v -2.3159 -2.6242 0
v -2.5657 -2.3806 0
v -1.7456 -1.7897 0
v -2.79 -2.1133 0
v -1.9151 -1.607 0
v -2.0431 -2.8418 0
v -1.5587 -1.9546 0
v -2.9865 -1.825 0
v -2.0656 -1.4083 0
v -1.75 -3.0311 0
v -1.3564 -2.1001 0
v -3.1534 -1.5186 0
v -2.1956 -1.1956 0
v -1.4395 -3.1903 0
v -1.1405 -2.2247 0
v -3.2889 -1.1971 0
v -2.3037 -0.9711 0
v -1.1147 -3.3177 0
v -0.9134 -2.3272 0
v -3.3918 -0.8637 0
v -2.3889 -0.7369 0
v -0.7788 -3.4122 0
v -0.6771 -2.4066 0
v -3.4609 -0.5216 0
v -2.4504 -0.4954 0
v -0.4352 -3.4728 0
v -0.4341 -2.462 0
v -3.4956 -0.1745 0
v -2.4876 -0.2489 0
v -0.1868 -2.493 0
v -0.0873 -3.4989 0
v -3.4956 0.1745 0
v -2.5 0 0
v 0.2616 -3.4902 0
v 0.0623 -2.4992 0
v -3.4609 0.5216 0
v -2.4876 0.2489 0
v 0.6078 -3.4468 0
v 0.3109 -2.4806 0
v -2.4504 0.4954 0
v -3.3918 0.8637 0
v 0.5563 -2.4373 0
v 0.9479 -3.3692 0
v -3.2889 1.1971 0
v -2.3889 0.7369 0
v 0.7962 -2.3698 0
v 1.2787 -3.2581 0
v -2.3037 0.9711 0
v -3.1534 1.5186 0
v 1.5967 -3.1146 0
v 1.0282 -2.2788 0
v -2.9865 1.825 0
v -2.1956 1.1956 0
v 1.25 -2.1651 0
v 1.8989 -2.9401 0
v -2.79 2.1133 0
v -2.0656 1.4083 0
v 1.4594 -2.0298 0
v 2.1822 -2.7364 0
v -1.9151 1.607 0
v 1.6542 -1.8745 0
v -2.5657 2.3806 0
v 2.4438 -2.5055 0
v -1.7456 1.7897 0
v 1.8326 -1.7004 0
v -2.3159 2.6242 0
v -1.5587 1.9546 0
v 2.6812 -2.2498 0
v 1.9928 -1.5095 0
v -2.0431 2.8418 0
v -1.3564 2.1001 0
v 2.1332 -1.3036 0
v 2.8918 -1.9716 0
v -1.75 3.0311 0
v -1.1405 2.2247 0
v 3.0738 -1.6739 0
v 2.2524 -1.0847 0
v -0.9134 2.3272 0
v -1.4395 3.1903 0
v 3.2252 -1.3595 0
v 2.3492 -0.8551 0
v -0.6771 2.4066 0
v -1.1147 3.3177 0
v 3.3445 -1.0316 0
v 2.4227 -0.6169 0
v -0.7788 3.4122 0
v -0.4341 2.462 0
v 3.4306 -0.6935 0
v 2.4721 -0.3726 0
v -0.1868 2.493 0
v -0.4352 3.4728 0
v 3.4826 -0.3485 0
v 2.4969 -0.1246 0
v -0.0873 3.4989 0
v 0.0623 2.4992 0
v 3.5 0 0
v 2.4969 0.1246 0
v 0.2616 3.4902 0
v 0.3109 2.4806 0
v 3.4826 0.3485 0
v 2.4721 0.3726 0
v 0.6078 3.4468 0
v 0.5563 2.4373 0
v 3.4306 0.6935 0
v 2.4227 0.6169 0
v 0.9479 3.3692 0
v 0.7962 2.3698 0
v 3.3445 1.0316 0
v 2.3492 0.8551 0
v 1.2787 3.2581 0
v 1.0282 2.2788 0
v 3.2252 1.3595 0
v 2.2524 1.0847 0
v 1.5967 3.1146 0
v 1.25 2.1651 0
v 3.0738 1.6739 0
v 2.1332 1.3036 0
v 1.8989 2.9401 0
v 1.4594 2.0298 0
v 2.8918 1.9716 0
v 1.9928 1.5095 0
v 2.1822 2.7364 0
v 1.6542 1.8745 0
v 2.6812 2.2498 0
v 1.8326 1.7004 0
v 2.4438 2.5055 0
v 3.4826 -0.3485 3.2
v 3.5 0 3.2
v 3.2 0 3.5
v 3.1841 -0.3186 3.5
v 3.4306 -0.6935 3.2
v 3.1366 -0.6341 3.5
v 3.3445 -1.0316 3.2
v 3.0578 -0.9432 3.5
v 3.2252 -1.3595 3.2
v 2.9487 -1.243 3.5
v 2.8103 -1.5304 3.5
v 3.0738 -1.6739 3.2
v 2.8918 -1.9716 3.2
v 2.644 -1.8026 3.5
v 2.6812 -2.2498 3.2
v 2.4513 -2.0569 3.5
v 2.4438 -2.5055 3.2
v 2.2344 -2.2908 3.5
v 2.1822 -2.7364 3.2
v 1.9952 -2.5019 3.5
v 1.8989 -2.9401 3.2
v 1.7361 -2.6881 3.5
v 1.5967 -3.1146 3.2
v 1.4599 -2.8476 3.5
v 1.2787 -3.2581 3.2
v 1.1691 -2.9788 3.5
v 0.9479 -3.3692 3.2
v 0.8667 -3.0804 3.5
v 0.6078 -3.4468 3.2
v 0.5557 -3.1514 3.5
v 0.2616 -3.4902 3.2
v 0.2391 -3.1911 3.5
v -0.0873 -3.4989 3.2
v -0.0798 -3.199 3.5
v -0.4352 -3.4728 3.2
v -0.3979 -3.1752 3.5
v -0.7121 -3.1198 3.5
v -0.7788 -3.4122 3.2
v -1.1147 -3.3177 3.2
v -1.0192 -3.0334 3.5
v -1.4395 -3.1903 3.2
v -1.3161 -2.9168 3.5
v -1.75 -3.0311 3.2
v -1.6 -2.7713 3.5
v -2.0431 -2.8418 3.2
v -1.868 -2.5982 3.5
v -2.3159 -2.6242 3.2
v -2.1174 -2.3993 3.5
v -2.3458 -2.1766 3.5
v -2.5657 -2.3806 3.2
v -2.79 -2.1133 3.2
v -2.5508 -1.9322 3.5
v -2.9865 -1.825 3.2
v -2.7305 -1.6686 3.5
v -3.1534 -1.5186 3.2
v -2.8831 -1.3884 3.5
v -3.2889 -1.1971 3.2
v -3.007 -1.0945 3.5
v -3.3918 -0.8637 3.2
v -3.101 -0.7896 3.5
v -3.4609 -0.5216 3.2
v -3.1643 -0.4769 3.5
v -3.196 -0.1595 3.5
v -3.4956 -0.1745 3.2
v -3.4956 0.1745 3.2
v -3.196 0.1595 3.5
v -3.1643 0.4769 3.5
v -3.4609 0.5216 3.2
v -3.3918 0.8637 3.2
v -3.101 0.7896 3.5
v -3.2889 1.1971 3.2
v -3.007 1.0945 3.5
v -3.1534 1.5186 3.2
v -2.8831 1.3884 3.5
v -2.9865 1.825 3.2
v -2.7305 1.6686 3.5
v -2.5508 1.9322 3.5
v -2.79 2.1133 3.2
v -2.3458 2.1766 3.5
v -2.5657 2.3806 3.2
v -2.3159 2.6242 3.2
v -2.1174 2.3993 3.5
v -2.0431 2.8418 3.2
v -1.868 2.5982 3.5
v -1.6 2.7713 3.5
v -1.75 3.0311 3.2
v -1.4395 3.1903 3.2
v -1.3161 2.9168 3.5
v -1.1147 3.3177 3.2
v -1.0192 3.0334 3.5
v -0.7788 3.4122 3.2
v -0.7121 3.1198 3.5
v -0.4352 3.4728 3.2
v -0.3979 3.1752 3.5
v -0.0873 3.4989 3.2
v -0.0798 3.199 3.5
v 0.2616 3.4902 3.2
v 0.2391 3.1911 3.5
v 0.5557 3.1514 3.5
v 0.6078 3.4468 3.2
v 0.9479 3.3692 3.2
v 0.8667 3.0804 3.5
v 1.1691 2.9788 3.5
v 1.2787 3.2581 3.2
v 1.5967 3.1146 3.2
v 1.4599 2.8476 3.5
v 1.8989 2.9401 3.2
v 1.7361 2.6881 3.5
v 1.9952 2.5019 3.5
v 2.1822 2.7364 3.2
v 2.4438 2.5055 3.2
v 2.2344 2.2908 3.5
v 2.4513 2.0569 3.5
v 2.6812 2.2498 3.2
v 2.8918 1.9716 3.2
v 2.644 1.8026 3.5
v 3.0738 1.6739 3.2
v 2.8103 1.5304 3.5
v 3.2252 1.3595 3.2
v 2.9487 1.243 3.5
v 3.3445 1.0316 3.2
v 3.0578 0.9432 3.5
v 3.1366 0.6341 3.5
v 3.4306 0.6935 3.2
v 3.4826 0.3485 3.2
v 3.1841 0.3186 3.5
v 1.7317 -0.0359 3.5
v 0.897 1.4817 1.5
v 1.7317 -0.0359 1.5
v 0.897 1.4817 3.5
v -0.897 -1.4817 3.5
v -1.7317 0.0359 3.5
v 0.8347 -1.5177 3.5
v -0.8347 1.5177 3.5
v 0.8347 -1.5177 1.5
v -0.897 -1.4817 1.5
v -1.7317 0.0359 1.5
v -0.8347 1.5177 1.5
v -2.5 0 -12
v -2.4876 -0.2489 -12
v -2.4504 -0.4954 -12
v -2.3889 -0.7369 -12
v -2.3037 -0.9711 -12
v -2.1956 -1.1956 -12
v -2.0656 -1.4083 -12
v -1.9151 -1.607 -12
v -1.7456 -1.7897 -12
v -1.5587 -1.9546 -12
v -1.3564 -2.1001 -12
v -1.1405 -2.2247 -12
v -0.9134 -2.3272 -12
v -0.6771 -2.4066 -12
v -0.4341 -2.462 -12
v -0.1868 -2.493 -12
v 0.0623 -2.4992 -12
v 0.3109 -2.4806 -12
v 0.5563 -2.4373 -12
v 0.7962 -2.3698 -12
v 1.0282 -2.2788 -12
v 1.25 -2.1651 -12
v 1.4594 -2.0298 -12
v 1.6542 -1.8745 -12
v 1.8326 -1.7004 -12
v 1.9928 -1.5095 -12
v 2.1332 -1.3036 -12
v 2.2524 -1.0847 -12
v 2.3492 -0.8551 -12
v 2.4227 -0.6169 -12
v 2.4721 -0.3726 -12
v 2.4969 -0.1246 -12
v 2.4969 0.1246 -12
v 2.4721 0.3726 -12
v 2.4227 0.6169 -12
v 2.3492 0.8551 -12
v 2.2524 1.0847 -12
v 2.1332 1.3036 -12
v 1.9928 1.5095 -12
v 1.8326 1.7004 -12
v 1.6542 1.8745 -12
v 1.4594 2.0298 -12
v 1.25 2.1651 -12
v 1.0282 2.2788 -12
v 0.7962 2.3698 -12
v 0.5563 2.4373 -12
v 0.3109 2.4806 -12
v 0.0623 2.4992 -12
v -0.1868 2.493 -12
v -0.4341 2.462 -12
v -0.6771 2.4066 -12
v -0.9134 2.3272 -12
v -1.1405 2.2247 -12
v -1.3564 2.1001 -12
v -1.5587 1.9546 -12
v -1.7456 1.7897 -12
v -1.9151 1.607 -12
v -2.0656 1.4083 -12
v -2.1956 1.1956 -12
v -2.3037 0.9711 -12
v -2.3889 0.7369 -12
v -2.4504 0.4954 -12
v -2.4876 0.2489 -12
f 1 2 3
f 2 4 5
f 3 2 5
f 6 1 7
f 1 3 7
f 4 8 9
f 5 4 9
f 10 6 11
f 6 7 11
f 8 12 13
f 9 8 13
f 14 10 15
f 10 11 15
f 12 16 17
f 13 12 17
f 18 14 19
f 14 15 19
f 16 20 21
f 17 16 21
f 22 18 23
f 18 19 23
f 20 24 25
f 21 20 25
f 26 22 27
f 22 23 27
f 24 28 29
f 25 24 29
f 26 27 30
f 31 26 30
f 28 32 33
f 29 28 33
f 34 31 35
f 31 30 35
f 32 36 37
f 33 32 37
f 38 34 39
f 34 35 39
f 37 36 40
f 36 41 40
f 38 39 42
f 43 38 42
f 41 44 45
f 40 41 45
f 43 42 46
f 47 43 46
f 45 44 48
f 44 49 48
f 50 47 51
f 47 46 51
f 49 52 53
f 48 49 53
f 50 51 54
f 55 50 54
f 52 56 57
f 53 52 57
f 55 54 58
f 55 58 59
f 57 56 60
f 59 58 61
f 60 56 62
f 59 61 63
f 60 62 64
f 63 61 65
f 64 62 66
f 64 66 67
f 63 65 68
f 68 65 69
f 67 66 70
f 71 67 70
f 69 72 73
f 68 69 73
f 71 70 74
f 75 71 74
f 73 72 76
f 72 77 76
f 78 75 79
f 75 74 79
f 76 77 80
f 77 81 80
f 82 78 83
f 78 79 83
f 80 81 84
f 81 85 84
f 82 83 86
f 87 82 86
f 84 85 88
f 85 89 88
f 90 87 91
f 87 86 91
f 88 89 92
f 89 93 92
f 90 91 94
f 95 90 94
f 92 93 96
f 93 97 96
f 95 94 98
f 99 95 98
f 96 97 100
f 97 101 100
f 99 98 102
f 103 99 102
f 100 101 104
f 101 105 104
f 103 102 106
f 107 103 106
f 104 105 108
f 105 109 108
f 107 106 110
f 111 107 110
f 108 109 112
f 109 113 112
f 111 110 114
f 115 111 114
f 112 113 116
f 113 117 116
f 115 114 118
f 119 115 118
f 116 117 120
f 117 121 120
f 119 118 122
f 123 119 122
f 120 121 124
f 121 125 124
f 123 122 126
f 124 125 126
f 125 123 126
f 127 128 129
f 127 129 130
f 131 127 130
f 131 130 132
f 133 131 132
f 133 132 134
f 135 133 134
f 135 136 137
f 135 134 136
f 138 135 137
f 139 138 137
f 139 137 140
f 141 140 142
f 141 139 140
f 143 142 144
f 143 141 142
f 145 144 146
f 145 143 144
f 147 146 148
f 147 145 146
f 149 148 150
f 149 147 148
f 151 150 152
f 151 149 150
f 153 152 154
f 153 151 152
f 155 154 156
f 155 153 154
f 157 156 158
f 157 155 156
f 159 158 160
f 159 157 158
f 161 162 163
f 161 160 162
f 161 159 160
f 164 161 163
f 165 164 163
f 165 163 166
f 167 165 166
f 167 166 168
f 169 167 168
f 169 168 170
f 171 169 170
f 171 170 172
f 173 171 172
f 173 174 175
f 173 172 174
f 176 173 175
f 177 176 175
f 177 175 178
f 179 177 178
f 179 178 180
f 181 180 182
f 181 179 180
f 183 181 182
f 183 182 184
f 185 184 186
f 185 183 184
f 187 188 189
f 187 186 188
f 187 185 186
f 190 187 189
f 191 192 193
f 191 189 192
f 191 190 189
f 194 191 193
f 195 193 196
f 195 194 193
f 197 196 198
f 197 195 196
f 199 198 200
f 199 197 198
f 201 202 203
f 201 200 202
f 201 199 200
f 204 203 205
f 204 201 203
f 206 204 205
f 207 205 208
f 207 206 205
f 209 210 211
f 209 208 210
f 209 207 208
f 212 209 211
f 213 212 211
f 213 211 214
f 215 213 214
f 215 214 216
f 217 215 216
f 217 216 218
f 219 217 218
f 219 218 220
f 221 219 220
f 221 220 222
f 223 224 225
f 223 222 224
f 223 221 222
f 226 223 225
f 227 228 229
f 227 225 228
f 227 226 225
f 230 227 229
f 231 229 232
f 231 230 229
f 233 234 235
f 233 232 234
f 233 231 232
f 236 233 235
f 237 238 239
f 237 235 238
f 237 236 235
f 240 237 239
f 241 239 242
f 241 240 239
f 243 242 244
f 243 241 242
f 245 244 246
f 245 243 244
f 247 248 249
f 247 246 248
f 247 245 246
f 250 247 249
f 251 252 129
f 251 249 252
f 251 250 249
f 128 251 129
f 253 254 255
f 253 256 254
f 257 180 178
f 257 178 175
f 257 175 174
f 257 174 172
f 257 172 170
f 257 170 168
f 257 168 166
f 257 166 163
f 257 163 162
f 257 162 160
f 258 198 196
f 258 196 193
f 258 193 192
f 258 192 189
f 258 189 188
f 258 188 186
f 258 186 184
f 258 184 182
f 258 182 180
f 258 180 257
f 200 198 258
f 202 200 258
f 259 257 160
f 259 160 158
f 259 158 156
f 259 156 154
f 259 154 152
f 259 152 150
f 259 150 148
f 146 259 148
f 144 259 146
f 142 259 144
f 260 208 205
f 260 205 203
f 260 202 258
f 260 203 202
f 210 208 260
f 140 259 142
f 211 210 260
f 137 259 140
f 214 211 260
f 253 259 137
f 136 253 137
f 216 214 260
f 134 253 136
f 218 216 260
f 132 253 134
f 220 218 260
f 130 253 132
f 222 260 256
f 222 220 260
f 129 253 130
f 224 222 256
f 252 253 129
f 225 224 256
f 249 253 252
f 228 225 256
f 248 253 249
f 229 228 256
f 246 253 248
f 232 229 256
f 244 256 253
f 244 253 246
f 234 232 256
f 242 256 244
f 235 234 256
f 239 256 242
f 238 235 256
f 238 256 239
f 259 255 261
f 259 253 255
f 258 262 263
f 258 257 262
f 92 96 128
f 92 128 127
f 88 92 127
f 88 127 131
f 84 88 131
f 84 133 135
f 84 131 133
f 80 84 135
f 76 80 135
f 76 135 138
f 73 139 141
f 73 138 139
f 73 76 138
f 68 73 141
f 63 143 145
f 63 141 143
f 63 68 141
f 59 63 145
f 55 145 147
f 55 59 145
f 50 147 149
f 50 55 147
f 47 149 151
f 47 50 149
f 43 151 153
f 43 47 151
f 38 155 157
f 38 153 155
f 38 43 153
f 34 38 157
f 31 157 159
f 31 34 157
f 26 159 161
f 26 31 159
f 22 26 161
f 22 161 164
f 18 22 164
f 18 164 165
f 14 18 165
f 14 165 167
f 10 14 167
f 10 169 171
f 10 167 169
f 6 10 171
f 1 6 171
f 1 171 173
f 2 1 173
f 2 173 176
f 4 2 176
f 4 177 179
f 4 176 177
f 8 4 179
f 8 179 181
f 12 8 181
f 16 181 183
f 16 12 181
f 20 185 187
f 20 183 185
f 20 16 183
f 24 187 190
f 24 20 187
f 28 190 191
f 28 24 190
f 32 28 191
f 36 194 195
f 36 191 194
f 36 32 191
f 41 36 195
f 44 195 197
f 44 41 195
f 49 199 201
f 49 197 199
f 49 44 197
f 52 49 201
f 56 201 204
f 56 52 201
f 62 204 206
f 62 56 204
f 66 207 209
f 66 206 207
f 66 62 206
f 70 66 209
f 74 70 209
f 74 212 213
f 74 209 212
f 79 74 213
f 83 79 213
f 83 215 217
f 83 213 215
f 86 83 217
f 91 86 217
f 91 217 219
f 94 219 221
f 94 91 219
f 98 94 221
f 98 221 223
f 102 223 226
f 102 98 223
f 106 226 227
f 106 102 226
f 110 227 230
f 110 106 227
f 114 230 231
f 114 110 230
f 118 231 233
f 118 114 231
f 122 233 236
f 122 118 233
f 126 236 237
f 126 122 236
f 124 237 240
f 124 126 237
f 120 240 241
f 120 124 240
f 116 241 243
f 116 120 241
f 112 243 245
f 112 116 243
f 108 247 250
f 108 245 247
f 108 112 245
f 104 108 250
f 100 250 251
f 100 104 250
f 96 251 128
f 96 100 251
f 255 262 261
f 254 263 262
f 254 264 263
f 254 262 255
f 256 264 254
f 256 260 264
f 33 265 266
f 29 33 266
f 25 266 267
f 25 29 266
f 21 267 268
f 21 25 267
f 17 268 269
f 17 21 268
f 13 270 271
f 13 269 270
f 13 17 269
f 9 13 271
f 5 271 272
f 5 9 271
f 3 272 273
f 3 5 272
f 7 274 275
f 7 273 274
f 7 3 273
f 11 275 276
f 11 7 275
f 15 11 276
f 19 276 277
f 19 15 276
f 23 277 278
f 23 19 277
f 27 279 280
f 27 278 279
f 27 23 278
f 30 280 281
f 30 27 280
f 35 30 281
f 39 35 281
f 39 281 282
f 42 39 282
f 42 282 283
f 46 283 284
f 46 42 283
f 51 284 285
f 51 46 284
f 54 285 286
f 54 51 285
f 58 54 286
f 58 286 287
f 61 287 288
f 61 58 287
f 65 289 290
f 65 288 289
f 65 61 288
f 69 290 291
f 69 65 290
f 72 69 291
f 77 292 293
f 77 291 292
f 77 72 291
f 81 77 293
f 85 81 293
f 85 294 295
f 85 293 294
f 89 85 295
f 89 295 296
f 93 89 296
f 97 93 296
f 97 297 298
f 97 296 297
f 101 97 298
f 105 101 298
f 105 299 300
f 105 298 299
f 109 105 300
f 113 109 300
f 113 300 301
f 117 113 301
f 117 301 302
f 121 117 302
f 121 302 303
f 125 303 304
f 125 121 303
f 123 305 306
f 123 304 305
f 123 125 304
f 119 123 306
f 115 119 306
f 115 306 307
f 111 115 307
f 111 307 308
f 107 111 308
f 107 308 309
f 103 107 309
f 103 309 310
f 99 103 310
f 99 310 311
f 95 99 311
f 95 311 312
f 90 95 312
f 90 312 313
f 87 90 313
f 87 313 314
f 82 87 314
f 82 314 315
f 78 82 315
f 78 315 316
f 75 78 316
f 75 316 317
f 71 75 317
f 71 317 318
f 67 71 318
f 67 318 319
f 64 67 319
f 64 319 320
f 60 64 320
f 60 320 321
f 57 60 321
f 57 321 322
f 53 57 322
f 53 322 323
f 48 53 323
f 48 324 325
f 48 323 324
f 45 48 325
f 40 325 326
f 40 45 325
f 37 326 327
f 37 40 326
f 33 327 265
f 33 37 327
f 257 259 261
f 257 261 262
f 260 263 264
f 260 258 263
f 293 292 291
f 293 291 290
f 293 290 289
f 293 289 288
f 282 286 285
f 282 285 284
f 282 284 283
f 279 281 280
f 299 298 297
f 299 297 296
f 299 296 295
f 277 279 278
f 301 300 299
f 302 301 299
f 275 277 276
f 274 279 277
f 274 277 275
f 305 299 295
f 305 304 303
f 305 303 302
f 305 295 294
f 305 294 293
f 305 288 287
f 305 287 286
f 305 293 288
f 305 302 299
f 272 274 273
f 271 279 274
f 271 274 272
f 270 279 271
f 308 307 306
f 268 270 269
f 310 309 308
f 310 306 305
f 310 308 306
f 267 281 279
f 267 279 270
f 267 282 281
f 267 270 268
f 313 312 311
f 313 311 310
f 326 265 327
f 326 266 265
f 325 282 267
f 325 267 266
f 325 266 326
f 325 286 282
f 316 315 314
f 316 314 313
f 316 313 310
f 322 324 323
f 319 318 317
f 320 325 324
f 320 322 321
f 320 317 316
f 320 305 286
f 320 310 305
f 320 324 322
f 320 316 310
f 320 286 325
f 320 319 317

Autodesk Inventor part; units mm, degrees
ref_plane "YZ Plane" through (0, 0, 0) normal (1, 0, 0) x (0, 1, 0)
ref_plane "XZ Plane" through (0, 0, 0) normal (0, 1, 0) x (-1, 0, 0)
ref_plane "XY Plane" through (0, 0, 0) normal (0, 0, 1) x (1, 0, 0)
sketch "Sketch1" plane through (0, 0, 0) normal (0, 0, 1) x (1, 0, 0)
  circle A0 centre (0, 0) radius 3.5
  dimension "d0" = 7
extrude "Extrusion1" add sketch "Sketch1" along normal blind 3.5
sketch "Sketch2" plane through (0, 0, 0) normal (0, 0, -1) x (-1, 0, 0)
  circle A0 centre (0, 0) radius 2.5
  dimension "d3" = 5
extrude "Extrusion2" add sketch "Sketch2" along normal blind 12
sketch "Sketch3" plane through (0, 0, 3.5) normal (0, 0, 1) x (1, 0, 0)
  circle A0 centre (0, 0) radius 3.5 projected
  line L0 (-0.8347, 1.5177) -> (0.897, 1.4817)
  line L1 (0.897, 1.4817) -> (1.7317, -0.0359)
  line L2 (1.7317, -0.0359) -> (0.8347, -1.5177)
  line L3 (0.8347, -1.5177) -> (-0.897, -1.4817)
  line L4 (-0.897, -1.4817) -> (-1.7317, 0.0359)
  line L5 (-1.7317, 0.0359) -> (-0.8347, 1.5177)
  dimension "d6" = 3
extrude "Extrusion3" cut sketch "Sketch3" against normal blind 2 contours L0 L1 L2 L3 L4 L5
thread "Thread1" size "M5x0.8" class "6g" standard "ANSI Metric M Profile" full length
chamfer "Chamfer1" distance 0.3 angle 45 1 edges at (-3.5, 0, 3.5)
properties part number "M5 Cap Head Screw"
